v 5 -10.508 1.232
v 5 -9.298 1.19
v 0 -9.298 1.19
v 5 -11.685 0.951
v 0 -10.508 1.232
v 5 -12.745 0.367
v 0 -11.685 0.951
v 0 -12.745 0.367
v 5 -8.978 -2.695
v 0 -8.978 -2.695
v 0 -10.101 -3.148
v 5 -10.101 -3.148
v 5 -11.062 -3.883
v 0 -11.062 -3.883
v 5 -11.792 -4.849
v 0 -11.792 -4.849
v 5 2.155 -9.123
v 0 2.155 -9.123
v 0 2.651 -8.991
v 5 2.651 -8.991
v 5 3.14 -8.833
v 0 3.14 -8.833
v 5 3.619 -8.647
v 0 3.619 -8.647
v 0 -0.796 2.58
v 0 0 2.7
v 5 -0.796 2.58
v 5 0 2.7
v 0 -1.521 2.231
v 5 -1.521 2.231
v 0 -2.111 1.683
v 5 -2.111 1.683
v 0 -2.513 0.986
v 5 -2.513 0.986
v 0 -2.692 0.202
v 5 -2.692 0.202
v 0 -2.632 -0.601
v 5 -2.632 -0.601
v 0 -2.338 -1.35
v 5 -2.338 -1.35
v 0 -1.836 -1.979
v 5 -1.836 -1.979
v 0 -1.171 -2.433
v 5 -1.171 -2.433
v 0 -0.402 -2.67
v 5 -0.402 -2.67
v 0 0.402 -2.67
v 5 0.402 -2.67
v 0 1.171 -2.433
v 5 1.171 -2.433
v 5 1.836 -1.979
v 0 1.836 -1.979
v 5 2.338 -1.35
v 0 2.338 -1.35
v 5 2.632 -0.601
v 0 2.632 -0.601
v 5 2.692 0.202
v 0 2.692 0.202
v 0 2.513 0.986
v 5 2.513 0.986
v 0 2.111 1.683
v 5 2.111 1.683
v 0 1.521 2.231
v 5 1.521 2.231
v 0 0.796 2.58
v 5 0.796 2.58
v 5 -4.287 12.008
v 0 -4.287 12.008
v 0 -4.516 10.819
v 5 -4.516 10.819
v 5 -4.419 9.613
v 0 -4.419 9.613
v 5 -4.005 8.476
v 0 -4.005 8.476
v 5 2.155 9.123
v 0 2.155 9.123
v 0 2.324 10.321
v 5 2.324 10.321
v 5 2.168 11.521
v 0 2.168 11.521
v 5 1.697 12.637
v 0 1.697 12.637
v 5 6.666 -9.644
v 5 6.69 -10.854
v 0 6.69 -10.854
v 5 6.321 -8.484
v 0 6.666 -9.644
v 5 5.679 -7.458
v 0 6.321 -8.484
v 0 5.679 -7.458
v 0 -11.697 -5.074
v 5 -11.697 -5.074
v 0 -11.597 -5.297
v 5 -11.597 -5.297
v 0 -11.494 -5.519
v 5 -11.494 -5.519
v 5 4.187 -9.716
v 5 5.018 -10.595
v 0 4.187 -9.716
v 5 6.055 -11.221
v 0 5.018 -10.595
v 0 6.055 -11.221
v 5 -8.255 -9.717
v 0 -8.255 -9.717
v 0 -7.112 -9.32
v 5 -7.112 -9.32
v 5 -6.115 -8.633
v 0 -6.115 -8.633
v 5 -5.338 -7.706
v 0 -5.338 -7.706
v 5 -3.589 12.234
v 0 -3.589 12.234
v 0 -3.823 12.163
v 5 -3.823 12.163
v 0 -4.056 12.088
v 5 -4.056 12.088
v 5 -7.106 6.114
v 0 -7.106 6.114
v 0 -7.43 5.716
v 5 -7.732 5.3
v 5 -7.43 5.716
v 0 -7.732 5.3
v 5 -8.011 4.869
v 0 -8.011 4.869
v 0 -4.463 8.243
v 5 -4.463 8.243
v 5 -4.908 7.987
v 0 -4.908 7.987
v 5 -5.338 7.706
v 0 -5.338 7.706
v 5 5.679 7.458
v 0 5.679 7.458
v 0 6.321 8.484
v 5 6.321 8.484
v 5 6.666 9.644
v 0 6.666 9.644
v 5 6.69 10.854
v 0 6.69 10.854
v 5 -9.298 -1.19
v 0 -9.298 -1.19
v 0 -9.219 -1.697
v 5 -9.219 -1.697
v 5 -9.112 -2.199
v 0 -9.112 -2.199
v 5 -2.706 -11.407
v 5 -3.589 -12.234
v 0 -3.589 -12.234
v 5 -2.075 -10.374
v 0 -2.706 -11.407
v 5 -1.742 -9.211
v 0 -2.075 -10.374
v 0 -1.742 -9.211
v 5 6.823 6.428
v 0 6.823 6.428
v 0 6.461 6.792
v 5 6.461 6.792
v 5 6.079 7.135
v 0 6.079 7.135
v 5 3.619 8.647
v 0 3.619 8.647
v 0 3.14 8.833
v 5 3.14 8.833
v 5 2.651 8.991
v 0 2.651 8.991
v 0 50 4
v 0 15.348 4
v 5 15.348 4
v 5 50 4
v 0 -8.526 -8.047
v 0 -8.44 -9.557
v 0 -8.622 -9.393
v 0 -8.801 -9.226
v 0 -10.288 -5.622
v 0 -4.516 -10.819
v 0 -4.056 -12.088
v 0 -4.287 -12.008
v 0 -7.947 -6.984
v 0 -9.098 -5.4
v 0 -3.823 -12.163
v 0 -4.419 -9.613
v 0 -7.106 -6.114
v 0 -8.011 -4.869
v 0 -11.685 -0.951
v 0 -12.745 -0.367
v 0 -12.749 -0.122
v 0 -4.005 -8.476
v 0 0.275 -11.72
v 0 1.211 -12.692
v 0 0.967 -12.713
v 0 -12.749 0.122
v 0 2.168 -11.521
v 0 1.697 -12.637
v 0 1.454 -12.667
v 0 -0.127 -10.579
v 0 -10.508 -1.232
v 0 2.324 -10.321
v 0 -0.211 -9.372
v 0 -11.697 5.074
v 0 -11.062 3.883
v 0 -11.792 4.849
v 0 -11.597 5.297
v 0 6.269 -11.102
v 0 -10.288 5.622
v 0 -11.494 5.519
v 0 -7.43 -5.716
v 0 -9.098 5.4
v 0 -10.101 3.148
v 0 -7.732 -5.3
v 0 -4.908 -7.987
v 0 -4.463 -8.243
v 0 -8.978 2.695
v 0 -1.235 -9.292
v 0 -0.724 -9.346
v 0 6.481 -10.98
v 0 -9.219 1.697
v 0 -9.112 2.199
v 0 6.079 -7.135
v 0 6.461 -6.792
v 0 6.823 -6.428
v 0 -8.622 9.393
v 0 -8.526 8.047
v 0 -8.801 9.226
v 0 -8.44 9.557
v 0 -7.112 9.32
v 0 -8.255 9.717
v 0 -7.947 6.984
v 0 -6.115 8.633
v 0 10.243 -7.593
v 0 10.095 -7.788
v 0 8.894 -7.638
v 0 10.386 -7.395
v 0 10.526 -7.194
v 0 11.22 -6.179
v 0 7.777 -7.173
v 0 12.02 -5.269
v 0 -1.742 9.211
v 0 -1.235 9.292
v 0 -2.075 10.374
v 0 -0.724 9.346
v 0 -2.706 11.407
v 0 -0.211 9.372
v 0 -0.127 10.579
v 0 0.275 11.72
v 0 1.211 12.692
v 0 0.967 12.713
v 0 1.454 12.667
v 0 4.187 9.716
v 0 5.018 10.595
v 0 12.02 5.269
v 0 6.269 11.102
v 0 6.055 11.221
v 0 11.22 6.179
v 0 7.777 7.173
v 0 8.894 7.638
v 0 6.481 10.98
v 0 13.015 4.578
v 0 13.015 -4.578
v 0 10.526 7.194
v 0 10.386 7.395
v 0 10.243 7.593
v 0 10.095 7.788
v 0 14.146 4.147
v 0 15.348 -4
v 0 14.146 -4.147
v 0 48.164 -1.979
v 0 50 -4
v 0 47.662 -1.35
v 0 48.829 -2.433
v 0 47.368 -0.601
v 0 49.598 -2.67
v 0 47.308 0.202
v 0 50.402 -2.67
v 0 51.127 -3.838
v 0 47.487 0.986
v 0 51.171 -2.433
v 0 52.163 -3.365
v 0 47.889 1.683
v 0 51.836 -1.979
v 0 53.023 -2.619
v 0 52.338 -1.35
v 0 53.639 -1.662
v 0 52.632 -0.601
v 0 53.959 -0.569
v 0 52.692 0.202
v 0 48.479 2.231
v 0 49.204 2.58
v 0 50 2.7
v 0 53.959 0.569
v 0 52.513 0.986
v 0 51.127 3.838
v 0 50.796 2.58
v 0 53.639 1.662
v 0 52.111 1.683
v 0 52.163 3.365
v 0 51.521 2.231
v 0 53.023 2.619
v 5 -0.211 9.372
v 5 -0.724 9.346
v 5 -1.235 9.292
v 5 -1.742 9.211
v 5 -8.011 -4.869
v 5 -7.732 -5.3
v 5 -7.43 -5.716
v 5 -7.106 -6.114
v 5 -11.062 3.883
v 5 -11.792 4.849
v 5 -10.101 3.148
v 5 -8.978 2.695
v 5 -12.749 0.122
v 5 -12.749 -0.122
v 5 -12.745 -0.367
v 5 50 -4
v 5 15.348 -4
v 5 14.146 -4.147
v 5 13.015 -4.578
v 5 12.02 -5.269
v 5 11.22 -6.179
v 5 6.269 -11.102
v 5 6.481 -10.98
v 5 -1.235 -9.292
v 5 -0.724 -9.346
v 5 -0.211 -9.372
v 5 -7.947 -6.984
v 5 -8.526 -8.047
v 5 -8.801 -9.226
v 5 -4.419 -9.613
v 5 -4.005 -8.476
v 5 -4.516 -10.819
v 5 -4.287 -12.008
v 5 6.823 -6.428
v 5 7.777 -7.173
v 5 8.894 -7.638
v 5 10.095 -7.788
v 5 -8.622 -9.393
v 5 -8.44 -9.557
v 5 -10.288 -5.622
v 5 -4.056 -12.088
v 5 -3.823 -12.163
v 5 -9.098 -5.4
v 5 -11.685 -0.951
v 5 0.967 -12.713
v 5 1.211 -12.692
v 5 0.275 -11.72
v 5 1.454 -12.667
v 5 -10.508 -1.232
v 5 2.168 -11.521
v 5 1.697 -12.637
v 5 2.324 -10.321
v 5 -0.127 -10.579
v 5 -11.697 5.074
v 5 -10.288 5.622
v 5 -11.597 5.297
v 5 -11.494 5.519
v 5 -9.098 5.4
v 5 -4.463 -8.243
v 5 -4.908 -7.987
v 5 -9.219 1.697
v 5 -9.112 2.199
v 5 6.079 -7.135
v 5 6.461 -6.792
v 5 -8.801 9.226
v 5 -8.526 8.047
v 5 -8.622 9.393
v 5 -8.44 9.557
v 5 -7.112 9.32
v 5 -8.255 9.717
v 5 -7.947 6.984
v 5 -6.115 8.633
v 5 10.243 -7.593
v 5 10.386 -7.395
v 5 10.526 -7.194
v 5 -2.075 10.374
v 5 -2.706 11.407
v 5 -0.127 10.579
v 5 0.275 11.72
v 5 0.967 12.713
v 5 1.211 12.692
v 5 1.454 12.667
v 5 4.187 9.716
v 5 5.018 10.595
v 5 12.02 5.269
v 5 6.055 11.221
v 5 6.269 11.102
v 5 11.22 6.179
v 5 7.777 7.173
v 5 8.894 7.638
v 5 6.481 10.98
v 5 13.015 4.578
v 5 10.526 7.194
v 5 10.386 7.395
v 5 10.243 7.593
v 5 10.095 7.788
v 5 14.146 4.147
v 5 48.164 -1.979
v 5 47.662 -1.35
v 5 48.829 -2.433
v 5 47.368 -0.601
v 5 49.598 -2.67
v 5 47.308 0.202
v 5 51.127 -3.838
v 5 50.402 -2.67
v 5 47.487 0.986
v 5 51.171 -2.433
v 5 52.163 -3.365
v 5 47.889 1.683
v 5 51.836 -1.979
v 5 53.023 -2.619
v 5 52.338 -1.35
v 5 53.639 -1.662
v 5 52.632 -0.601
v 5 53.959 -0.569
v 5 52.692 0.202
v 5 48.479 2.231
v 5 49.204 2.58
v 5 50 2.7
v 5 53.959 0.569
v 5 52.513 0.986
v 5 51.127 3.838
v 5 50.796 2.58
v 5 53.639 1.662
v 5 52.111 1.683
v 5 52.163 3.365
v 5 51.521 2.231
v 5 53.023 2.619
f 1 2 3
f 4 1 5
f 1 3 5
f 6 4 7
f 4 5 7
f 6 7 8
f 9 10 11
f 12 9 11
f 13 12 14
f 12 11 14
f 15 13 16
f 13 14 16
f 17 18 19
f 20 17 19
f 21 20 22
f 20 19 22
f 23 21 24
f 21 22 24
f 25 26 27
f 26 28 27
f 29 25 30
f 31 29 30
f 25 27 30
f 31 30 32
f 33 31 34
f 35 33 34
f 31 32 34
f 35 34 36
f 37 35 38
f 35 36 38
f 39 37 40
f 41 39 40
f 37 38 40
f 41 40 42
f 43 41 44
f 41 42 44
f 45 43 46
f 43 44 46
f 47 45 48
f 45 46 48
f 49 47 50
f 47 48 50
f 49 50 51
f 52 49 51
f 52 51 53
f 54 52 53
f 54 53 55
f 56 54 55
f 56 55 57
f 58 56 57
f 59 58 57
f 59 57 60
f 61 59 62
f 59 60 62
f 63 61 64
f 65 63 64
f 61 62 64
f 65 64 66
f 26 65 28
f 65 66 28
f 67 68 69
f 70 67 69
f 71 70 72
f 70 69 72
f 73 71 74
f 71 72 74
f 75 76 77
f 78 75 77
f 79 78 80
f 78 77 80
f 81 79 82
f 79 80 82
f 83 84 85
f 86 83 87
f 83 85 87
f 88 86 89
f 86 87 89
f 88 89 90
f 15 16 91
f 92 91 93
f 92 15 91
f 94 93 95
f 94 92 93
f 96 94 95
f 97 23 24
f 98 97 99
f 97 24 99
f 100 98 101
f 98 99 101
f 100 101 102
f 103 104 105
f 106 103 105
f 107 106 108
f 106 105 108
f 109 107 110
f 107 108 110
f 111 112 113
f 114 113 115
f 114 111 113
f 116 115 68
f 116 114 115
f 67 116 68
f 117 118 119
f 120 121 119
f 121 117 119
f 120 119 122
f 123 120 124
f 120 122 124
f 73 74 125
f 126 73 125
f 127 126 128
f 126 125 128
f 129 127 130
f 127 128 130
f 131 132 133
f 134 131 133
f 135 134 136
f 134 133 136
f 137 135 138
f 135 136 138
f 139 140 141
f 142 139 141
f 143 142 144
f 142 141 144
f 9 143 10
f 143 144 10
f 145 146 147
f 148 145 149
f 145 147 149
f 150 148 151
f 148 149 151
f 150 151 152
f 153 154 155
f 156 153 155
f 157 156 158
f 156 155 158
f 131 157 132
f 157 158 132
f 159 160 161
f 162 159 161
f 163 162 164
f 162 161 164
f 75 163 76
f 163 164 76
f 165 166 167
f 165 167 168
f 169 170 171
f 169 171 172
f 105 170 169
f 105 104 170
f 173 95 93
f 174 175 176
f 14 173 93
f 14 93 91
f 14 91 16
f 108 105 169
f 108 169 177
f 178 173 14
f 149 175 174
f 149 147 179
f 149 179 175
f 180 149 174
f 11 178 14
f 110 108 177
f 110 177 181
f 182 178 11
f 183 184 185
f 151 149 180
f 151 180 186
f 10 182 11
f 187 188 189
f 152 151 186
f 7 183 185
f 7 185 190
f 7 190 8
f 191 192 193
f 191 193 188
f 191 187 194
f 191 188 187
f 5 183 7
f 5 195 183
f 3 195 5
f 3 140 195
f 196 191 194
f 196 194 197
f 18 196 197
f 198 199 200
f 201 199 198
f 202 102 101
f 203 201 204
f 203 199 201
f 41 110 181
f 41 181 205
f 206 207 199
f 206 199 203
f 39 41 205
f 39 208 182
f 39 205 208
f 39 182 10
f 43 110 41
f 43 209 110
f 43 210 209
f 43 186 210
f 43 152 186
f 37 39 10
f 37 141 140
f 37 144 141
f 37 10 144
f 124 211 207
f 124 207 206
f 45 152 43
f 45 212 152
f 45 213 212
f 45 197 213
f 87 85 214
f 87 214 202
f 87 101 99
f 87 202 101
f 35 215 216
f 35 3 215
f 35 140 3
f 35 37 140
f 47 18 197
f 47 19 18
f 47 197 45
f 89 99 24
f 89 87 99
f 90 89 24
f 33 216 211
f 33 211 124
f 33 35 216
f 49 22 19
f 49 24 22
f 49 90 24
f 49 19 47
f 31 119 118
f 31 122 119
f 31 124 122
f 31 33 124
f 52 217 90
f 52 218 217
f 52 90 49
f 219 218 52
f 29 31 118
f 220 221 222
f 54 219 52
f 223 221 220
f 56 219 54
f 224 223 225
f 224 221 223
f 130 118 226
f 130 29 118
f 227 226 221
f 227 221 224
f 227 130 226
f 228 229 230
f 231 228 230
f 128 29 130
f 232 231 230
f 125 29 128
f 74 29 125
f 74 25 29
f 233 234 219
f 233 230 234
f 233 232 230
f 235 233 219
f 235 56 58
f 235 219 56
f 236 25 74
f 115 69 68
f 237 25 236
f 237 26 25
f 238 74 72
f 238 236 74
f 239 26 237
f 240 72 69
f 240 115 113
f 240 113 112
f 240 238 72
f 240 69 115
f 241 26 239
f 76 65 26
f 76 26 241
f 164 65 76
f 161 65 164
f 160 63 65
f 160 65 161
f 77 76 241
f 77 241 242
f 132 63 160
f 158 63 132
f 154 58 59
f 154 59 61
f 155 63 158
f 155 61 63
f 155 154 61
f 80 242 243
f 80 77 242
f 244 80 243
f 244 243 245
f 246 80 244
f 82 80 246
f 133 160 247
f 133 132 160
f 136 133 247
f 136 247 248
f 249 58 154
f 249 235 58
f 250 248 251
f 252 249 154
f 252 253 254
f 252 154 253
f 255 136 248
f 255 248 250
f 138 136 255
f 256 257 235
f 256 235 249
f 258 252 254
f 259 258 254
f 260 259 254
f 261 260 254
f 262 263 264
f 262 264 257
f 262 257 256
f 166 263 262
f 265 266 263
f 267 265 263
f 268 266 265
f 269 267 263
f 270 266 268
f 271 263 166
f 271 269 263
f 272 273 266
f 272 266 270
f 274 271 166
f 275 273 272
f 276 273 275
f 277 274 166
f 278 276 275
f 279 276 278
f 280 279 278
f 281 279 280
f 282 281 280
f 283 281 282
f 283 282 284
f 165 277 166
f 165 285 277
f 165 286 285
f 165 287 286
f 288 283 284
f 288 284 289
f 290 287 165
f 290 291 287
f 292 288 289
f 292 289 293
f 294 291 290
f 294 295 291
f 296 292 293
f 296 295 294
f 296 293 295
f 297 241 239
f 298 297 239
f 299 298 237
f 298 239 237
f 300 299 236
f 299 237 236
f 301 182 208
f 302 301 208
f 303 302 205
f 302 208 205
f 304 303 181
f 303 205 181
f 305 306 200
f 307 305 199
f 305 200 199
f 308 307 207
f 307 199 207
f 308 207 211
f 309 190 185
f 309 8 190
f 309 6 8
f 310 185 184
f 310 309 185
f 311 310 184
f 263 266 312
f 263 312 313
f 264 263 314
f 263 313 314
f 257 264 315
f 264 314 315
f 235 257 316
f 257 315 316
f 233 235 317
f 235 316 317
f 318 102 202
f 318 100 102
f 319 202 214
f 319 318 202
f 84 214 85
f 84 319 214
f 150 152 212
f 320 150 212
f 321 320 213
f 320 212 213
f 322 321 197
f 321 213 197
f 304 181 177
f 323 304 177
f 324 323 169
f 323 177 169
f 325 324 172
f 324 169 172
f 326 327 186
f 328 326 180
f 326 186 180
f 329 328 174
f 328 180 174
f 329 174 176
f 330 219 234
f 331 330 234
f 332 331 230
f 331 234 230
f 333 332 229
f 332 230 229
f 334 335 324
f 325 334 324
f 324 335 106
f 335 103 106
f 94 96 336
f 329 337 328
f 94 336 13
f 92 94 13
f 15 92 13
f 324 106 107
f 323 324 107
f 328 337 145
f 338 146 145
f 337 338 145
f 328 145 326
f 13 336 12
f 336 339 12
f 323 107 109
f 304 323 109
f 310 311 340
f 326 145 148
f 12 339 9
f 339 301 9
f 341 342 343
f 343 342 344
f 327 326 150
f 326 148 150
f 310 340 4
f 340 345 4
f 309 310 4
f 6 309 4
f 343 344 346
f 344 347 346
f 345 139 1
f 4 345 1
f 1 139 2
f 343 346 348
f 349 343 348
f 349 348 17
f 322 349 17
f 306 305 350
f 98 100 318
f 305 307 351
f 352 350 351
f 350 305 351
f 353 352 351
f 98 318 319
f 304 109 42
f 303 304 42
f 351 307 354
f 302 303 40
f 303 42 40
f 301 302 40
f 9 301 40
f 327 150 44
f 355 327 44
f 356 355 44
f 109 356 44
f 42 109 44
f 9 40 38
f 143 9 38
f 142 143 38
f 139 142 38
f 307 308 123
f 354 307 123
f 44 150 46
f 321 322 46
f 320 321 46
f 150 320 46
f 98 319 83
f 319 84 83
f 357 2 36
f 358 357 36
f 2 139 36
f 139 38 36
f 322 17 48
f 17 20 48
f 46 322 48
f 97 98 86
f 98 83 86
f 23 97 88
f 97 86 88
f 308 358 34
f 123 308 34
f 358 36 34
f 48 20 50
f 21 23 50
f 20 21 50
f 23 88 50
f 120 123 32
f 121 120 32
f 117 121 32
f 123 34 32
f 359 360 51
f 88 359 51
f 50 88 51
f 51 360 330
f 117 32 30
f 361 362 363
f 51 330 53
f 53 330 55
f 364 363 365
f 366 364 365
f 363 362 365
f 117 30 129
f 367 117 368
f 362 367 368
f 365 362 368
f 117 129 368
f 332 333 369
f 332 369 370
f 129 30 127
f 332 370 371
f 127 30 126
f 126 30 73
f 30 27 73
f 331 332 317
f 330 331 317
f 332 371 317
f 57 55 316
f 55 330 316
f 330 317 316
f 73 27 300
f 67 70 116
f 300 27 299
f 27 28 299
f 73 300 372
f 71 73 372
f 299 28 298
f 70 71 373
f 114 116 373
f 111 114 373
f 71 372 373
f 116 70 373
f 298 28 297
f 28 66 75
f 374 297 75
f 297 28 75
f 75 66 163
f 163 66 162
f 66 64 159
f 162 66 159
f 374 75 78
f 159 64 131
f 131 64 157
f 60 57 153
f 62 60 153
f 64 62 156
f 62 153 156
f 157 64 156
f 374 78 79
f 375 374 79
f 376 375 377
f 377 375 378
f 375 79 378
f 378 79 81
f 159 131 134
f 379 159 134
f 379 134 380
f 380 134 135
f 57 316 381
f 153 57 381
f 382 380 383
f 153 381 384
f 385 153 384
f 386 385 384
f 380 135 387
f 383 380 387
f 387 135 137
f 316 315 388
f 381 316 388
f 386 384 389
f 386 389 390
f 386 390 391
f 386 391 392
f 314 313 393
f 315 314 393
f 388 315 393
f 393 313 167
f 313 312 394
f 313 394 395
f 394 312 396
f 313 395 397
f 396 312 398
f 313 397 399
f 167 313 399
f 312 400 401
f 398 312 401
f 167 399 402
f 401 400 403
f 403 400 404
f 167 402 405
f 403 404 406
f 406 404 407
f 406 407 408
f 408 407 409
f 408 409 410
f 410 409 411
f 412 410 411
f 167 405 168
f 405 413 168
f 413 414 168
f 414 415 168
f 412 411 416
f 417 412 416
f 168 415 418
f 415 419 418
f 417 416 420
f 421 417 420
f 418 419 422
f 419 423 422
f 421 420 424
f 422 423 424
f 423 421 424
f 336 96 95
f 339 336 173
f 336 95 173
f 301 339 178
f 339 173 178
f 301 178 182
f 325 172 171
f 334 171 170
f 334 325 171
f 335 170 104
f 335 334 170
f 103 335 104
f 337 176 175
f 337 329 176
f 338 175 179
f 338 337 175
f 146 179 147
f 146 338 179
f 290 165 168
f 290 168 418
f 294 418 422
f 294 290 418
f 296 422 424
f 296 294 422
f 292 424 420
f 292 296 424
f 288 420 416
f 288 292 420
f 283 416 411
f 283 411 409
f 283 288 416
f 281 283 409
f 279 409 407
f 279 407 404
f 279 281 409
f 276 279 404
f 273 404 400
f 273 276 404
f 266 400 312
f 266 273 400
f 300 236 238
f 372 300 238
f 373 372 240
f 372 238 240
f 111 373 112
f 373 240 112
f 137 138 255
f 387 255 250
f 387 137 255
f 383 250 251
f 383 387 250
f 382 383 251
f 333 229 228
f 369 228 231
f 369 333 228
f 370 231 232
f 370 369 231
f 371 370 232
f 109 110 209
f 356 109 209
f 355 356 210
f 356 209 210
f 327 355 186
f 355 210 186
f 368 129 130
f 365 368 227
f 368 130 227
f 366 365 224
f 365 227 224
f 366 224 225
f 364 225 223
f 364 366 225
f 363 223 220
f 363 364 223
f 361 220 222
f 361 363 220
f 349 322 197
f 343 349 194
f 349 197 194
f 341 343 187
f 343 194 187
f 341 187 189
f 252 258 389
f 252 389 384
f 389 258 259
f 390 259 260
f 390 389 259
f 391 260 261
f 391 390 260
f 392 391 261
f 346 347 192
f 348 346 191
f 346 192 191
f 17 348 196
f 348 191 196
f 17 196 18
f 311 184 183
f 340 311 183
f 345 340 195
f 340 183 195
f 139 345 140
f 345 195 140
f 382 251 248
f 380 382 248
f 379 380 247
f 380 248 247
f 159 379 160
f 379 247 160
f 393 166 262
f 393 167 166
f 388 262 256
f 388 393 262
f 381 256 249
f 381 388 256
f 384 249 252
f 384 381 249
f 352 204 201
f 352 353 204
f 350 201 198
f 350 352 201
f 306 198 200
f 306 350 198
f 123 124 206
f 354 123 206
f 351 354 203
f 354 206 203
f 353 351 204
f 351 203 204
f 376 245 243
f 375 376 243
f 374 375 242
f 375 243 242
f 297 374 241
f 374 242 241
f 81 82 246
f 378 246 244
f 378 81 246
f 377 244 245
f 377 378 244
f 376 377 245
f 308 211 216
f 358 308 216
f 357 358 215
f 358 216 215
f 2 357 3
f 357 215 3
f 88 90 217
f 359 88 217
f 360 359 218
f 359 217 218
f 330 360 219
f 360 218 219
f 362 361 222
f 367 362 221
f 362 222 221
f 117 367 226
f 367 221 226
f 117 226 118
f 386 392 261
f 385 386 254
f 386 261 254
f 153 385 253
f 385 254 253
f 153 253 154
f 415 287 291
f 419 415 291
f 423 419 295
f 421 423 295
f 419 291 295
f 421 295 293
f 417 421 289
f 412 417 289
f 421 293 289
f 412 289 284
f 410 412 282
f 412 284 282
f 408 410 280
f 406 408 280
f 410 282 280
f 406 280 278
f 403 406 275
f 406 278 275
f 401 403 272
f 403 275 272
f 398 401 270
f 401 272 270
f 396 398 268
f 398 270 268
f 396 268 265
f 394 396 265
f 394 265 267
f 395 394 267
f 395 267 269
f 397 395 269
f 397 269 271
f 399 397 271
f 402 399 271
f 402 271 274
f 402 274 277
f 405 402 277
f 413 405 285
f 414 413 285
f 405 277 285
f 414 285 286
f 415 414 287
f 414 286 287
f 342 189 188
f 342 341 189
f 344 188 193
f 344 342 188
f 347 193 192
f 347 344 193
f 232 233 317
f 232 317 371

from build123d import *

# Parameters (mm, degrees)
BASPROSKE_W         = 5
BASPROSKE_H         = 12.75
TOOTHCUT_DEPTH      = 19.711627401
TEETHCUTS_COUNT     = 15
TEETHCUTS_ANGLE     = 336
BORSKE_R            = 2.7
BORE_DEPTH          = 50.0015748
SKETCH1_R           = 2.7
BOSS_EXTRUDE1_DEPTH = 5
FILLET1_R           = 5


with BuildPart() as part:
    # BasProSke → Base-Revolve (revolve)
    with BuildSketch(Plane(origin=(0, 0, 0), x_dir=(1, 0, 0), z_dir=(0, 1, 0)), mode=Mode.PRIVATE) as base_revolve_sk:
        with Locations((2.5, 6.375)):
            Rectangle(BASPROSKE_W, BASPROSKE_H)
    revolve(base_revolve_sk.sketch.rotate(Axis((-10, 0, 0), (1, 0, 0)), 180), axis=Axis((-10, 0, 0), (1, 0, 0)))

    # TooCutSke → ToothCut (cut, through all)
    with BuildSketch(Plane(origin=(0, 0, 0), x_dir=(0, 0, -1), z_dir=(1, 0, 0))):
        with BuildLine():
            ThreePointArc((0.769645606, 9.34235097), (0, 9.374), (-0.769645606, 9.34235097))
            ThreePointArc((-0.769645606, 9.34235097), (-1.209019537, 11.113083179), (-2.315283452, 12.563849239))
            ThreePointArc((-2.315283452, 12.563849239), (0, 12.7754), (2.315283452, 12.563849239))
            ThreePointArc((2.315283452, 12.563849239), (1.209019537, 11.113083179), (0.769645606, 9.34235097))
        make_face()
    toothcut = extrude(amount=TOOTHCUT_DEPTH, mode=Mode.SUBTRACT)

    # TeethCuts: ToothCut ×15 about axis
    teethcuts_axis = Axis((-10, 0, 0), (1, 0, 0))
    for i in range(1, TEETHCUTS_COUNT):
        add(toothcut.rotate(teethcuts_axis, i * TEETHCUTS_ANGLE / (TEETHCUTS_COUNT - 1)), mode=Mode.SUBTRACT)

    # BorSke → Bore (cut, symmetric)
    with BuildSketch(Plane(origin=(0, 0, 0), x_dir=(0, 0, -1), z_dir=(1, 0, 0))):
        with Locations(Location((0, 0, 0), (0, 0, 180))):
            Circle(BORSKE_R)
    extrude(amount=BORE_DEPTH, both=True, mode=Mode.SUBTRACT)

    # Sketch1 → Boss-Extrude1 (add)
    with BuildSketch(Plane.ZY):
        with BuildLine():
            Line((4, 12.709543162), (4, 50))
            ThreePointArc((4, 50), (0, 54), (-4, 50))
            Line((-4, 50), (-4, 12.709543162))
            Line((-4, 12.709543162), (-7.194322072, 10.526358816))
            Line((-7.194322072, 10.526358816), (-4.502982719, 8.221619222))
            Line((-4.502982719, 8.221619222), (4.502982719, 8.221619222))
            Line((4.502982719, 8.221619222), (7.194322072, 10.526358816))
            Line((7.194322072, 10.526358816), (4, 12.709543162))
        make_face()
        with Locations((0, 50)):
            Circle(SKETCH1_R, mode=Mode.SUBTRACT)
    extrude(amount=-BOSS_EXTRUDE1_DEPTH)

    # Fillet1
    fillet1_edges = [part.edges().sort_by_distance(p)[0] for p in [
        (2.5, 12.709543162, 4),
        (2.5, 12.709543162, -4),
    ]]
    fillet(fillet1_edges, radius=FILLET1_R)


solid = part.part
